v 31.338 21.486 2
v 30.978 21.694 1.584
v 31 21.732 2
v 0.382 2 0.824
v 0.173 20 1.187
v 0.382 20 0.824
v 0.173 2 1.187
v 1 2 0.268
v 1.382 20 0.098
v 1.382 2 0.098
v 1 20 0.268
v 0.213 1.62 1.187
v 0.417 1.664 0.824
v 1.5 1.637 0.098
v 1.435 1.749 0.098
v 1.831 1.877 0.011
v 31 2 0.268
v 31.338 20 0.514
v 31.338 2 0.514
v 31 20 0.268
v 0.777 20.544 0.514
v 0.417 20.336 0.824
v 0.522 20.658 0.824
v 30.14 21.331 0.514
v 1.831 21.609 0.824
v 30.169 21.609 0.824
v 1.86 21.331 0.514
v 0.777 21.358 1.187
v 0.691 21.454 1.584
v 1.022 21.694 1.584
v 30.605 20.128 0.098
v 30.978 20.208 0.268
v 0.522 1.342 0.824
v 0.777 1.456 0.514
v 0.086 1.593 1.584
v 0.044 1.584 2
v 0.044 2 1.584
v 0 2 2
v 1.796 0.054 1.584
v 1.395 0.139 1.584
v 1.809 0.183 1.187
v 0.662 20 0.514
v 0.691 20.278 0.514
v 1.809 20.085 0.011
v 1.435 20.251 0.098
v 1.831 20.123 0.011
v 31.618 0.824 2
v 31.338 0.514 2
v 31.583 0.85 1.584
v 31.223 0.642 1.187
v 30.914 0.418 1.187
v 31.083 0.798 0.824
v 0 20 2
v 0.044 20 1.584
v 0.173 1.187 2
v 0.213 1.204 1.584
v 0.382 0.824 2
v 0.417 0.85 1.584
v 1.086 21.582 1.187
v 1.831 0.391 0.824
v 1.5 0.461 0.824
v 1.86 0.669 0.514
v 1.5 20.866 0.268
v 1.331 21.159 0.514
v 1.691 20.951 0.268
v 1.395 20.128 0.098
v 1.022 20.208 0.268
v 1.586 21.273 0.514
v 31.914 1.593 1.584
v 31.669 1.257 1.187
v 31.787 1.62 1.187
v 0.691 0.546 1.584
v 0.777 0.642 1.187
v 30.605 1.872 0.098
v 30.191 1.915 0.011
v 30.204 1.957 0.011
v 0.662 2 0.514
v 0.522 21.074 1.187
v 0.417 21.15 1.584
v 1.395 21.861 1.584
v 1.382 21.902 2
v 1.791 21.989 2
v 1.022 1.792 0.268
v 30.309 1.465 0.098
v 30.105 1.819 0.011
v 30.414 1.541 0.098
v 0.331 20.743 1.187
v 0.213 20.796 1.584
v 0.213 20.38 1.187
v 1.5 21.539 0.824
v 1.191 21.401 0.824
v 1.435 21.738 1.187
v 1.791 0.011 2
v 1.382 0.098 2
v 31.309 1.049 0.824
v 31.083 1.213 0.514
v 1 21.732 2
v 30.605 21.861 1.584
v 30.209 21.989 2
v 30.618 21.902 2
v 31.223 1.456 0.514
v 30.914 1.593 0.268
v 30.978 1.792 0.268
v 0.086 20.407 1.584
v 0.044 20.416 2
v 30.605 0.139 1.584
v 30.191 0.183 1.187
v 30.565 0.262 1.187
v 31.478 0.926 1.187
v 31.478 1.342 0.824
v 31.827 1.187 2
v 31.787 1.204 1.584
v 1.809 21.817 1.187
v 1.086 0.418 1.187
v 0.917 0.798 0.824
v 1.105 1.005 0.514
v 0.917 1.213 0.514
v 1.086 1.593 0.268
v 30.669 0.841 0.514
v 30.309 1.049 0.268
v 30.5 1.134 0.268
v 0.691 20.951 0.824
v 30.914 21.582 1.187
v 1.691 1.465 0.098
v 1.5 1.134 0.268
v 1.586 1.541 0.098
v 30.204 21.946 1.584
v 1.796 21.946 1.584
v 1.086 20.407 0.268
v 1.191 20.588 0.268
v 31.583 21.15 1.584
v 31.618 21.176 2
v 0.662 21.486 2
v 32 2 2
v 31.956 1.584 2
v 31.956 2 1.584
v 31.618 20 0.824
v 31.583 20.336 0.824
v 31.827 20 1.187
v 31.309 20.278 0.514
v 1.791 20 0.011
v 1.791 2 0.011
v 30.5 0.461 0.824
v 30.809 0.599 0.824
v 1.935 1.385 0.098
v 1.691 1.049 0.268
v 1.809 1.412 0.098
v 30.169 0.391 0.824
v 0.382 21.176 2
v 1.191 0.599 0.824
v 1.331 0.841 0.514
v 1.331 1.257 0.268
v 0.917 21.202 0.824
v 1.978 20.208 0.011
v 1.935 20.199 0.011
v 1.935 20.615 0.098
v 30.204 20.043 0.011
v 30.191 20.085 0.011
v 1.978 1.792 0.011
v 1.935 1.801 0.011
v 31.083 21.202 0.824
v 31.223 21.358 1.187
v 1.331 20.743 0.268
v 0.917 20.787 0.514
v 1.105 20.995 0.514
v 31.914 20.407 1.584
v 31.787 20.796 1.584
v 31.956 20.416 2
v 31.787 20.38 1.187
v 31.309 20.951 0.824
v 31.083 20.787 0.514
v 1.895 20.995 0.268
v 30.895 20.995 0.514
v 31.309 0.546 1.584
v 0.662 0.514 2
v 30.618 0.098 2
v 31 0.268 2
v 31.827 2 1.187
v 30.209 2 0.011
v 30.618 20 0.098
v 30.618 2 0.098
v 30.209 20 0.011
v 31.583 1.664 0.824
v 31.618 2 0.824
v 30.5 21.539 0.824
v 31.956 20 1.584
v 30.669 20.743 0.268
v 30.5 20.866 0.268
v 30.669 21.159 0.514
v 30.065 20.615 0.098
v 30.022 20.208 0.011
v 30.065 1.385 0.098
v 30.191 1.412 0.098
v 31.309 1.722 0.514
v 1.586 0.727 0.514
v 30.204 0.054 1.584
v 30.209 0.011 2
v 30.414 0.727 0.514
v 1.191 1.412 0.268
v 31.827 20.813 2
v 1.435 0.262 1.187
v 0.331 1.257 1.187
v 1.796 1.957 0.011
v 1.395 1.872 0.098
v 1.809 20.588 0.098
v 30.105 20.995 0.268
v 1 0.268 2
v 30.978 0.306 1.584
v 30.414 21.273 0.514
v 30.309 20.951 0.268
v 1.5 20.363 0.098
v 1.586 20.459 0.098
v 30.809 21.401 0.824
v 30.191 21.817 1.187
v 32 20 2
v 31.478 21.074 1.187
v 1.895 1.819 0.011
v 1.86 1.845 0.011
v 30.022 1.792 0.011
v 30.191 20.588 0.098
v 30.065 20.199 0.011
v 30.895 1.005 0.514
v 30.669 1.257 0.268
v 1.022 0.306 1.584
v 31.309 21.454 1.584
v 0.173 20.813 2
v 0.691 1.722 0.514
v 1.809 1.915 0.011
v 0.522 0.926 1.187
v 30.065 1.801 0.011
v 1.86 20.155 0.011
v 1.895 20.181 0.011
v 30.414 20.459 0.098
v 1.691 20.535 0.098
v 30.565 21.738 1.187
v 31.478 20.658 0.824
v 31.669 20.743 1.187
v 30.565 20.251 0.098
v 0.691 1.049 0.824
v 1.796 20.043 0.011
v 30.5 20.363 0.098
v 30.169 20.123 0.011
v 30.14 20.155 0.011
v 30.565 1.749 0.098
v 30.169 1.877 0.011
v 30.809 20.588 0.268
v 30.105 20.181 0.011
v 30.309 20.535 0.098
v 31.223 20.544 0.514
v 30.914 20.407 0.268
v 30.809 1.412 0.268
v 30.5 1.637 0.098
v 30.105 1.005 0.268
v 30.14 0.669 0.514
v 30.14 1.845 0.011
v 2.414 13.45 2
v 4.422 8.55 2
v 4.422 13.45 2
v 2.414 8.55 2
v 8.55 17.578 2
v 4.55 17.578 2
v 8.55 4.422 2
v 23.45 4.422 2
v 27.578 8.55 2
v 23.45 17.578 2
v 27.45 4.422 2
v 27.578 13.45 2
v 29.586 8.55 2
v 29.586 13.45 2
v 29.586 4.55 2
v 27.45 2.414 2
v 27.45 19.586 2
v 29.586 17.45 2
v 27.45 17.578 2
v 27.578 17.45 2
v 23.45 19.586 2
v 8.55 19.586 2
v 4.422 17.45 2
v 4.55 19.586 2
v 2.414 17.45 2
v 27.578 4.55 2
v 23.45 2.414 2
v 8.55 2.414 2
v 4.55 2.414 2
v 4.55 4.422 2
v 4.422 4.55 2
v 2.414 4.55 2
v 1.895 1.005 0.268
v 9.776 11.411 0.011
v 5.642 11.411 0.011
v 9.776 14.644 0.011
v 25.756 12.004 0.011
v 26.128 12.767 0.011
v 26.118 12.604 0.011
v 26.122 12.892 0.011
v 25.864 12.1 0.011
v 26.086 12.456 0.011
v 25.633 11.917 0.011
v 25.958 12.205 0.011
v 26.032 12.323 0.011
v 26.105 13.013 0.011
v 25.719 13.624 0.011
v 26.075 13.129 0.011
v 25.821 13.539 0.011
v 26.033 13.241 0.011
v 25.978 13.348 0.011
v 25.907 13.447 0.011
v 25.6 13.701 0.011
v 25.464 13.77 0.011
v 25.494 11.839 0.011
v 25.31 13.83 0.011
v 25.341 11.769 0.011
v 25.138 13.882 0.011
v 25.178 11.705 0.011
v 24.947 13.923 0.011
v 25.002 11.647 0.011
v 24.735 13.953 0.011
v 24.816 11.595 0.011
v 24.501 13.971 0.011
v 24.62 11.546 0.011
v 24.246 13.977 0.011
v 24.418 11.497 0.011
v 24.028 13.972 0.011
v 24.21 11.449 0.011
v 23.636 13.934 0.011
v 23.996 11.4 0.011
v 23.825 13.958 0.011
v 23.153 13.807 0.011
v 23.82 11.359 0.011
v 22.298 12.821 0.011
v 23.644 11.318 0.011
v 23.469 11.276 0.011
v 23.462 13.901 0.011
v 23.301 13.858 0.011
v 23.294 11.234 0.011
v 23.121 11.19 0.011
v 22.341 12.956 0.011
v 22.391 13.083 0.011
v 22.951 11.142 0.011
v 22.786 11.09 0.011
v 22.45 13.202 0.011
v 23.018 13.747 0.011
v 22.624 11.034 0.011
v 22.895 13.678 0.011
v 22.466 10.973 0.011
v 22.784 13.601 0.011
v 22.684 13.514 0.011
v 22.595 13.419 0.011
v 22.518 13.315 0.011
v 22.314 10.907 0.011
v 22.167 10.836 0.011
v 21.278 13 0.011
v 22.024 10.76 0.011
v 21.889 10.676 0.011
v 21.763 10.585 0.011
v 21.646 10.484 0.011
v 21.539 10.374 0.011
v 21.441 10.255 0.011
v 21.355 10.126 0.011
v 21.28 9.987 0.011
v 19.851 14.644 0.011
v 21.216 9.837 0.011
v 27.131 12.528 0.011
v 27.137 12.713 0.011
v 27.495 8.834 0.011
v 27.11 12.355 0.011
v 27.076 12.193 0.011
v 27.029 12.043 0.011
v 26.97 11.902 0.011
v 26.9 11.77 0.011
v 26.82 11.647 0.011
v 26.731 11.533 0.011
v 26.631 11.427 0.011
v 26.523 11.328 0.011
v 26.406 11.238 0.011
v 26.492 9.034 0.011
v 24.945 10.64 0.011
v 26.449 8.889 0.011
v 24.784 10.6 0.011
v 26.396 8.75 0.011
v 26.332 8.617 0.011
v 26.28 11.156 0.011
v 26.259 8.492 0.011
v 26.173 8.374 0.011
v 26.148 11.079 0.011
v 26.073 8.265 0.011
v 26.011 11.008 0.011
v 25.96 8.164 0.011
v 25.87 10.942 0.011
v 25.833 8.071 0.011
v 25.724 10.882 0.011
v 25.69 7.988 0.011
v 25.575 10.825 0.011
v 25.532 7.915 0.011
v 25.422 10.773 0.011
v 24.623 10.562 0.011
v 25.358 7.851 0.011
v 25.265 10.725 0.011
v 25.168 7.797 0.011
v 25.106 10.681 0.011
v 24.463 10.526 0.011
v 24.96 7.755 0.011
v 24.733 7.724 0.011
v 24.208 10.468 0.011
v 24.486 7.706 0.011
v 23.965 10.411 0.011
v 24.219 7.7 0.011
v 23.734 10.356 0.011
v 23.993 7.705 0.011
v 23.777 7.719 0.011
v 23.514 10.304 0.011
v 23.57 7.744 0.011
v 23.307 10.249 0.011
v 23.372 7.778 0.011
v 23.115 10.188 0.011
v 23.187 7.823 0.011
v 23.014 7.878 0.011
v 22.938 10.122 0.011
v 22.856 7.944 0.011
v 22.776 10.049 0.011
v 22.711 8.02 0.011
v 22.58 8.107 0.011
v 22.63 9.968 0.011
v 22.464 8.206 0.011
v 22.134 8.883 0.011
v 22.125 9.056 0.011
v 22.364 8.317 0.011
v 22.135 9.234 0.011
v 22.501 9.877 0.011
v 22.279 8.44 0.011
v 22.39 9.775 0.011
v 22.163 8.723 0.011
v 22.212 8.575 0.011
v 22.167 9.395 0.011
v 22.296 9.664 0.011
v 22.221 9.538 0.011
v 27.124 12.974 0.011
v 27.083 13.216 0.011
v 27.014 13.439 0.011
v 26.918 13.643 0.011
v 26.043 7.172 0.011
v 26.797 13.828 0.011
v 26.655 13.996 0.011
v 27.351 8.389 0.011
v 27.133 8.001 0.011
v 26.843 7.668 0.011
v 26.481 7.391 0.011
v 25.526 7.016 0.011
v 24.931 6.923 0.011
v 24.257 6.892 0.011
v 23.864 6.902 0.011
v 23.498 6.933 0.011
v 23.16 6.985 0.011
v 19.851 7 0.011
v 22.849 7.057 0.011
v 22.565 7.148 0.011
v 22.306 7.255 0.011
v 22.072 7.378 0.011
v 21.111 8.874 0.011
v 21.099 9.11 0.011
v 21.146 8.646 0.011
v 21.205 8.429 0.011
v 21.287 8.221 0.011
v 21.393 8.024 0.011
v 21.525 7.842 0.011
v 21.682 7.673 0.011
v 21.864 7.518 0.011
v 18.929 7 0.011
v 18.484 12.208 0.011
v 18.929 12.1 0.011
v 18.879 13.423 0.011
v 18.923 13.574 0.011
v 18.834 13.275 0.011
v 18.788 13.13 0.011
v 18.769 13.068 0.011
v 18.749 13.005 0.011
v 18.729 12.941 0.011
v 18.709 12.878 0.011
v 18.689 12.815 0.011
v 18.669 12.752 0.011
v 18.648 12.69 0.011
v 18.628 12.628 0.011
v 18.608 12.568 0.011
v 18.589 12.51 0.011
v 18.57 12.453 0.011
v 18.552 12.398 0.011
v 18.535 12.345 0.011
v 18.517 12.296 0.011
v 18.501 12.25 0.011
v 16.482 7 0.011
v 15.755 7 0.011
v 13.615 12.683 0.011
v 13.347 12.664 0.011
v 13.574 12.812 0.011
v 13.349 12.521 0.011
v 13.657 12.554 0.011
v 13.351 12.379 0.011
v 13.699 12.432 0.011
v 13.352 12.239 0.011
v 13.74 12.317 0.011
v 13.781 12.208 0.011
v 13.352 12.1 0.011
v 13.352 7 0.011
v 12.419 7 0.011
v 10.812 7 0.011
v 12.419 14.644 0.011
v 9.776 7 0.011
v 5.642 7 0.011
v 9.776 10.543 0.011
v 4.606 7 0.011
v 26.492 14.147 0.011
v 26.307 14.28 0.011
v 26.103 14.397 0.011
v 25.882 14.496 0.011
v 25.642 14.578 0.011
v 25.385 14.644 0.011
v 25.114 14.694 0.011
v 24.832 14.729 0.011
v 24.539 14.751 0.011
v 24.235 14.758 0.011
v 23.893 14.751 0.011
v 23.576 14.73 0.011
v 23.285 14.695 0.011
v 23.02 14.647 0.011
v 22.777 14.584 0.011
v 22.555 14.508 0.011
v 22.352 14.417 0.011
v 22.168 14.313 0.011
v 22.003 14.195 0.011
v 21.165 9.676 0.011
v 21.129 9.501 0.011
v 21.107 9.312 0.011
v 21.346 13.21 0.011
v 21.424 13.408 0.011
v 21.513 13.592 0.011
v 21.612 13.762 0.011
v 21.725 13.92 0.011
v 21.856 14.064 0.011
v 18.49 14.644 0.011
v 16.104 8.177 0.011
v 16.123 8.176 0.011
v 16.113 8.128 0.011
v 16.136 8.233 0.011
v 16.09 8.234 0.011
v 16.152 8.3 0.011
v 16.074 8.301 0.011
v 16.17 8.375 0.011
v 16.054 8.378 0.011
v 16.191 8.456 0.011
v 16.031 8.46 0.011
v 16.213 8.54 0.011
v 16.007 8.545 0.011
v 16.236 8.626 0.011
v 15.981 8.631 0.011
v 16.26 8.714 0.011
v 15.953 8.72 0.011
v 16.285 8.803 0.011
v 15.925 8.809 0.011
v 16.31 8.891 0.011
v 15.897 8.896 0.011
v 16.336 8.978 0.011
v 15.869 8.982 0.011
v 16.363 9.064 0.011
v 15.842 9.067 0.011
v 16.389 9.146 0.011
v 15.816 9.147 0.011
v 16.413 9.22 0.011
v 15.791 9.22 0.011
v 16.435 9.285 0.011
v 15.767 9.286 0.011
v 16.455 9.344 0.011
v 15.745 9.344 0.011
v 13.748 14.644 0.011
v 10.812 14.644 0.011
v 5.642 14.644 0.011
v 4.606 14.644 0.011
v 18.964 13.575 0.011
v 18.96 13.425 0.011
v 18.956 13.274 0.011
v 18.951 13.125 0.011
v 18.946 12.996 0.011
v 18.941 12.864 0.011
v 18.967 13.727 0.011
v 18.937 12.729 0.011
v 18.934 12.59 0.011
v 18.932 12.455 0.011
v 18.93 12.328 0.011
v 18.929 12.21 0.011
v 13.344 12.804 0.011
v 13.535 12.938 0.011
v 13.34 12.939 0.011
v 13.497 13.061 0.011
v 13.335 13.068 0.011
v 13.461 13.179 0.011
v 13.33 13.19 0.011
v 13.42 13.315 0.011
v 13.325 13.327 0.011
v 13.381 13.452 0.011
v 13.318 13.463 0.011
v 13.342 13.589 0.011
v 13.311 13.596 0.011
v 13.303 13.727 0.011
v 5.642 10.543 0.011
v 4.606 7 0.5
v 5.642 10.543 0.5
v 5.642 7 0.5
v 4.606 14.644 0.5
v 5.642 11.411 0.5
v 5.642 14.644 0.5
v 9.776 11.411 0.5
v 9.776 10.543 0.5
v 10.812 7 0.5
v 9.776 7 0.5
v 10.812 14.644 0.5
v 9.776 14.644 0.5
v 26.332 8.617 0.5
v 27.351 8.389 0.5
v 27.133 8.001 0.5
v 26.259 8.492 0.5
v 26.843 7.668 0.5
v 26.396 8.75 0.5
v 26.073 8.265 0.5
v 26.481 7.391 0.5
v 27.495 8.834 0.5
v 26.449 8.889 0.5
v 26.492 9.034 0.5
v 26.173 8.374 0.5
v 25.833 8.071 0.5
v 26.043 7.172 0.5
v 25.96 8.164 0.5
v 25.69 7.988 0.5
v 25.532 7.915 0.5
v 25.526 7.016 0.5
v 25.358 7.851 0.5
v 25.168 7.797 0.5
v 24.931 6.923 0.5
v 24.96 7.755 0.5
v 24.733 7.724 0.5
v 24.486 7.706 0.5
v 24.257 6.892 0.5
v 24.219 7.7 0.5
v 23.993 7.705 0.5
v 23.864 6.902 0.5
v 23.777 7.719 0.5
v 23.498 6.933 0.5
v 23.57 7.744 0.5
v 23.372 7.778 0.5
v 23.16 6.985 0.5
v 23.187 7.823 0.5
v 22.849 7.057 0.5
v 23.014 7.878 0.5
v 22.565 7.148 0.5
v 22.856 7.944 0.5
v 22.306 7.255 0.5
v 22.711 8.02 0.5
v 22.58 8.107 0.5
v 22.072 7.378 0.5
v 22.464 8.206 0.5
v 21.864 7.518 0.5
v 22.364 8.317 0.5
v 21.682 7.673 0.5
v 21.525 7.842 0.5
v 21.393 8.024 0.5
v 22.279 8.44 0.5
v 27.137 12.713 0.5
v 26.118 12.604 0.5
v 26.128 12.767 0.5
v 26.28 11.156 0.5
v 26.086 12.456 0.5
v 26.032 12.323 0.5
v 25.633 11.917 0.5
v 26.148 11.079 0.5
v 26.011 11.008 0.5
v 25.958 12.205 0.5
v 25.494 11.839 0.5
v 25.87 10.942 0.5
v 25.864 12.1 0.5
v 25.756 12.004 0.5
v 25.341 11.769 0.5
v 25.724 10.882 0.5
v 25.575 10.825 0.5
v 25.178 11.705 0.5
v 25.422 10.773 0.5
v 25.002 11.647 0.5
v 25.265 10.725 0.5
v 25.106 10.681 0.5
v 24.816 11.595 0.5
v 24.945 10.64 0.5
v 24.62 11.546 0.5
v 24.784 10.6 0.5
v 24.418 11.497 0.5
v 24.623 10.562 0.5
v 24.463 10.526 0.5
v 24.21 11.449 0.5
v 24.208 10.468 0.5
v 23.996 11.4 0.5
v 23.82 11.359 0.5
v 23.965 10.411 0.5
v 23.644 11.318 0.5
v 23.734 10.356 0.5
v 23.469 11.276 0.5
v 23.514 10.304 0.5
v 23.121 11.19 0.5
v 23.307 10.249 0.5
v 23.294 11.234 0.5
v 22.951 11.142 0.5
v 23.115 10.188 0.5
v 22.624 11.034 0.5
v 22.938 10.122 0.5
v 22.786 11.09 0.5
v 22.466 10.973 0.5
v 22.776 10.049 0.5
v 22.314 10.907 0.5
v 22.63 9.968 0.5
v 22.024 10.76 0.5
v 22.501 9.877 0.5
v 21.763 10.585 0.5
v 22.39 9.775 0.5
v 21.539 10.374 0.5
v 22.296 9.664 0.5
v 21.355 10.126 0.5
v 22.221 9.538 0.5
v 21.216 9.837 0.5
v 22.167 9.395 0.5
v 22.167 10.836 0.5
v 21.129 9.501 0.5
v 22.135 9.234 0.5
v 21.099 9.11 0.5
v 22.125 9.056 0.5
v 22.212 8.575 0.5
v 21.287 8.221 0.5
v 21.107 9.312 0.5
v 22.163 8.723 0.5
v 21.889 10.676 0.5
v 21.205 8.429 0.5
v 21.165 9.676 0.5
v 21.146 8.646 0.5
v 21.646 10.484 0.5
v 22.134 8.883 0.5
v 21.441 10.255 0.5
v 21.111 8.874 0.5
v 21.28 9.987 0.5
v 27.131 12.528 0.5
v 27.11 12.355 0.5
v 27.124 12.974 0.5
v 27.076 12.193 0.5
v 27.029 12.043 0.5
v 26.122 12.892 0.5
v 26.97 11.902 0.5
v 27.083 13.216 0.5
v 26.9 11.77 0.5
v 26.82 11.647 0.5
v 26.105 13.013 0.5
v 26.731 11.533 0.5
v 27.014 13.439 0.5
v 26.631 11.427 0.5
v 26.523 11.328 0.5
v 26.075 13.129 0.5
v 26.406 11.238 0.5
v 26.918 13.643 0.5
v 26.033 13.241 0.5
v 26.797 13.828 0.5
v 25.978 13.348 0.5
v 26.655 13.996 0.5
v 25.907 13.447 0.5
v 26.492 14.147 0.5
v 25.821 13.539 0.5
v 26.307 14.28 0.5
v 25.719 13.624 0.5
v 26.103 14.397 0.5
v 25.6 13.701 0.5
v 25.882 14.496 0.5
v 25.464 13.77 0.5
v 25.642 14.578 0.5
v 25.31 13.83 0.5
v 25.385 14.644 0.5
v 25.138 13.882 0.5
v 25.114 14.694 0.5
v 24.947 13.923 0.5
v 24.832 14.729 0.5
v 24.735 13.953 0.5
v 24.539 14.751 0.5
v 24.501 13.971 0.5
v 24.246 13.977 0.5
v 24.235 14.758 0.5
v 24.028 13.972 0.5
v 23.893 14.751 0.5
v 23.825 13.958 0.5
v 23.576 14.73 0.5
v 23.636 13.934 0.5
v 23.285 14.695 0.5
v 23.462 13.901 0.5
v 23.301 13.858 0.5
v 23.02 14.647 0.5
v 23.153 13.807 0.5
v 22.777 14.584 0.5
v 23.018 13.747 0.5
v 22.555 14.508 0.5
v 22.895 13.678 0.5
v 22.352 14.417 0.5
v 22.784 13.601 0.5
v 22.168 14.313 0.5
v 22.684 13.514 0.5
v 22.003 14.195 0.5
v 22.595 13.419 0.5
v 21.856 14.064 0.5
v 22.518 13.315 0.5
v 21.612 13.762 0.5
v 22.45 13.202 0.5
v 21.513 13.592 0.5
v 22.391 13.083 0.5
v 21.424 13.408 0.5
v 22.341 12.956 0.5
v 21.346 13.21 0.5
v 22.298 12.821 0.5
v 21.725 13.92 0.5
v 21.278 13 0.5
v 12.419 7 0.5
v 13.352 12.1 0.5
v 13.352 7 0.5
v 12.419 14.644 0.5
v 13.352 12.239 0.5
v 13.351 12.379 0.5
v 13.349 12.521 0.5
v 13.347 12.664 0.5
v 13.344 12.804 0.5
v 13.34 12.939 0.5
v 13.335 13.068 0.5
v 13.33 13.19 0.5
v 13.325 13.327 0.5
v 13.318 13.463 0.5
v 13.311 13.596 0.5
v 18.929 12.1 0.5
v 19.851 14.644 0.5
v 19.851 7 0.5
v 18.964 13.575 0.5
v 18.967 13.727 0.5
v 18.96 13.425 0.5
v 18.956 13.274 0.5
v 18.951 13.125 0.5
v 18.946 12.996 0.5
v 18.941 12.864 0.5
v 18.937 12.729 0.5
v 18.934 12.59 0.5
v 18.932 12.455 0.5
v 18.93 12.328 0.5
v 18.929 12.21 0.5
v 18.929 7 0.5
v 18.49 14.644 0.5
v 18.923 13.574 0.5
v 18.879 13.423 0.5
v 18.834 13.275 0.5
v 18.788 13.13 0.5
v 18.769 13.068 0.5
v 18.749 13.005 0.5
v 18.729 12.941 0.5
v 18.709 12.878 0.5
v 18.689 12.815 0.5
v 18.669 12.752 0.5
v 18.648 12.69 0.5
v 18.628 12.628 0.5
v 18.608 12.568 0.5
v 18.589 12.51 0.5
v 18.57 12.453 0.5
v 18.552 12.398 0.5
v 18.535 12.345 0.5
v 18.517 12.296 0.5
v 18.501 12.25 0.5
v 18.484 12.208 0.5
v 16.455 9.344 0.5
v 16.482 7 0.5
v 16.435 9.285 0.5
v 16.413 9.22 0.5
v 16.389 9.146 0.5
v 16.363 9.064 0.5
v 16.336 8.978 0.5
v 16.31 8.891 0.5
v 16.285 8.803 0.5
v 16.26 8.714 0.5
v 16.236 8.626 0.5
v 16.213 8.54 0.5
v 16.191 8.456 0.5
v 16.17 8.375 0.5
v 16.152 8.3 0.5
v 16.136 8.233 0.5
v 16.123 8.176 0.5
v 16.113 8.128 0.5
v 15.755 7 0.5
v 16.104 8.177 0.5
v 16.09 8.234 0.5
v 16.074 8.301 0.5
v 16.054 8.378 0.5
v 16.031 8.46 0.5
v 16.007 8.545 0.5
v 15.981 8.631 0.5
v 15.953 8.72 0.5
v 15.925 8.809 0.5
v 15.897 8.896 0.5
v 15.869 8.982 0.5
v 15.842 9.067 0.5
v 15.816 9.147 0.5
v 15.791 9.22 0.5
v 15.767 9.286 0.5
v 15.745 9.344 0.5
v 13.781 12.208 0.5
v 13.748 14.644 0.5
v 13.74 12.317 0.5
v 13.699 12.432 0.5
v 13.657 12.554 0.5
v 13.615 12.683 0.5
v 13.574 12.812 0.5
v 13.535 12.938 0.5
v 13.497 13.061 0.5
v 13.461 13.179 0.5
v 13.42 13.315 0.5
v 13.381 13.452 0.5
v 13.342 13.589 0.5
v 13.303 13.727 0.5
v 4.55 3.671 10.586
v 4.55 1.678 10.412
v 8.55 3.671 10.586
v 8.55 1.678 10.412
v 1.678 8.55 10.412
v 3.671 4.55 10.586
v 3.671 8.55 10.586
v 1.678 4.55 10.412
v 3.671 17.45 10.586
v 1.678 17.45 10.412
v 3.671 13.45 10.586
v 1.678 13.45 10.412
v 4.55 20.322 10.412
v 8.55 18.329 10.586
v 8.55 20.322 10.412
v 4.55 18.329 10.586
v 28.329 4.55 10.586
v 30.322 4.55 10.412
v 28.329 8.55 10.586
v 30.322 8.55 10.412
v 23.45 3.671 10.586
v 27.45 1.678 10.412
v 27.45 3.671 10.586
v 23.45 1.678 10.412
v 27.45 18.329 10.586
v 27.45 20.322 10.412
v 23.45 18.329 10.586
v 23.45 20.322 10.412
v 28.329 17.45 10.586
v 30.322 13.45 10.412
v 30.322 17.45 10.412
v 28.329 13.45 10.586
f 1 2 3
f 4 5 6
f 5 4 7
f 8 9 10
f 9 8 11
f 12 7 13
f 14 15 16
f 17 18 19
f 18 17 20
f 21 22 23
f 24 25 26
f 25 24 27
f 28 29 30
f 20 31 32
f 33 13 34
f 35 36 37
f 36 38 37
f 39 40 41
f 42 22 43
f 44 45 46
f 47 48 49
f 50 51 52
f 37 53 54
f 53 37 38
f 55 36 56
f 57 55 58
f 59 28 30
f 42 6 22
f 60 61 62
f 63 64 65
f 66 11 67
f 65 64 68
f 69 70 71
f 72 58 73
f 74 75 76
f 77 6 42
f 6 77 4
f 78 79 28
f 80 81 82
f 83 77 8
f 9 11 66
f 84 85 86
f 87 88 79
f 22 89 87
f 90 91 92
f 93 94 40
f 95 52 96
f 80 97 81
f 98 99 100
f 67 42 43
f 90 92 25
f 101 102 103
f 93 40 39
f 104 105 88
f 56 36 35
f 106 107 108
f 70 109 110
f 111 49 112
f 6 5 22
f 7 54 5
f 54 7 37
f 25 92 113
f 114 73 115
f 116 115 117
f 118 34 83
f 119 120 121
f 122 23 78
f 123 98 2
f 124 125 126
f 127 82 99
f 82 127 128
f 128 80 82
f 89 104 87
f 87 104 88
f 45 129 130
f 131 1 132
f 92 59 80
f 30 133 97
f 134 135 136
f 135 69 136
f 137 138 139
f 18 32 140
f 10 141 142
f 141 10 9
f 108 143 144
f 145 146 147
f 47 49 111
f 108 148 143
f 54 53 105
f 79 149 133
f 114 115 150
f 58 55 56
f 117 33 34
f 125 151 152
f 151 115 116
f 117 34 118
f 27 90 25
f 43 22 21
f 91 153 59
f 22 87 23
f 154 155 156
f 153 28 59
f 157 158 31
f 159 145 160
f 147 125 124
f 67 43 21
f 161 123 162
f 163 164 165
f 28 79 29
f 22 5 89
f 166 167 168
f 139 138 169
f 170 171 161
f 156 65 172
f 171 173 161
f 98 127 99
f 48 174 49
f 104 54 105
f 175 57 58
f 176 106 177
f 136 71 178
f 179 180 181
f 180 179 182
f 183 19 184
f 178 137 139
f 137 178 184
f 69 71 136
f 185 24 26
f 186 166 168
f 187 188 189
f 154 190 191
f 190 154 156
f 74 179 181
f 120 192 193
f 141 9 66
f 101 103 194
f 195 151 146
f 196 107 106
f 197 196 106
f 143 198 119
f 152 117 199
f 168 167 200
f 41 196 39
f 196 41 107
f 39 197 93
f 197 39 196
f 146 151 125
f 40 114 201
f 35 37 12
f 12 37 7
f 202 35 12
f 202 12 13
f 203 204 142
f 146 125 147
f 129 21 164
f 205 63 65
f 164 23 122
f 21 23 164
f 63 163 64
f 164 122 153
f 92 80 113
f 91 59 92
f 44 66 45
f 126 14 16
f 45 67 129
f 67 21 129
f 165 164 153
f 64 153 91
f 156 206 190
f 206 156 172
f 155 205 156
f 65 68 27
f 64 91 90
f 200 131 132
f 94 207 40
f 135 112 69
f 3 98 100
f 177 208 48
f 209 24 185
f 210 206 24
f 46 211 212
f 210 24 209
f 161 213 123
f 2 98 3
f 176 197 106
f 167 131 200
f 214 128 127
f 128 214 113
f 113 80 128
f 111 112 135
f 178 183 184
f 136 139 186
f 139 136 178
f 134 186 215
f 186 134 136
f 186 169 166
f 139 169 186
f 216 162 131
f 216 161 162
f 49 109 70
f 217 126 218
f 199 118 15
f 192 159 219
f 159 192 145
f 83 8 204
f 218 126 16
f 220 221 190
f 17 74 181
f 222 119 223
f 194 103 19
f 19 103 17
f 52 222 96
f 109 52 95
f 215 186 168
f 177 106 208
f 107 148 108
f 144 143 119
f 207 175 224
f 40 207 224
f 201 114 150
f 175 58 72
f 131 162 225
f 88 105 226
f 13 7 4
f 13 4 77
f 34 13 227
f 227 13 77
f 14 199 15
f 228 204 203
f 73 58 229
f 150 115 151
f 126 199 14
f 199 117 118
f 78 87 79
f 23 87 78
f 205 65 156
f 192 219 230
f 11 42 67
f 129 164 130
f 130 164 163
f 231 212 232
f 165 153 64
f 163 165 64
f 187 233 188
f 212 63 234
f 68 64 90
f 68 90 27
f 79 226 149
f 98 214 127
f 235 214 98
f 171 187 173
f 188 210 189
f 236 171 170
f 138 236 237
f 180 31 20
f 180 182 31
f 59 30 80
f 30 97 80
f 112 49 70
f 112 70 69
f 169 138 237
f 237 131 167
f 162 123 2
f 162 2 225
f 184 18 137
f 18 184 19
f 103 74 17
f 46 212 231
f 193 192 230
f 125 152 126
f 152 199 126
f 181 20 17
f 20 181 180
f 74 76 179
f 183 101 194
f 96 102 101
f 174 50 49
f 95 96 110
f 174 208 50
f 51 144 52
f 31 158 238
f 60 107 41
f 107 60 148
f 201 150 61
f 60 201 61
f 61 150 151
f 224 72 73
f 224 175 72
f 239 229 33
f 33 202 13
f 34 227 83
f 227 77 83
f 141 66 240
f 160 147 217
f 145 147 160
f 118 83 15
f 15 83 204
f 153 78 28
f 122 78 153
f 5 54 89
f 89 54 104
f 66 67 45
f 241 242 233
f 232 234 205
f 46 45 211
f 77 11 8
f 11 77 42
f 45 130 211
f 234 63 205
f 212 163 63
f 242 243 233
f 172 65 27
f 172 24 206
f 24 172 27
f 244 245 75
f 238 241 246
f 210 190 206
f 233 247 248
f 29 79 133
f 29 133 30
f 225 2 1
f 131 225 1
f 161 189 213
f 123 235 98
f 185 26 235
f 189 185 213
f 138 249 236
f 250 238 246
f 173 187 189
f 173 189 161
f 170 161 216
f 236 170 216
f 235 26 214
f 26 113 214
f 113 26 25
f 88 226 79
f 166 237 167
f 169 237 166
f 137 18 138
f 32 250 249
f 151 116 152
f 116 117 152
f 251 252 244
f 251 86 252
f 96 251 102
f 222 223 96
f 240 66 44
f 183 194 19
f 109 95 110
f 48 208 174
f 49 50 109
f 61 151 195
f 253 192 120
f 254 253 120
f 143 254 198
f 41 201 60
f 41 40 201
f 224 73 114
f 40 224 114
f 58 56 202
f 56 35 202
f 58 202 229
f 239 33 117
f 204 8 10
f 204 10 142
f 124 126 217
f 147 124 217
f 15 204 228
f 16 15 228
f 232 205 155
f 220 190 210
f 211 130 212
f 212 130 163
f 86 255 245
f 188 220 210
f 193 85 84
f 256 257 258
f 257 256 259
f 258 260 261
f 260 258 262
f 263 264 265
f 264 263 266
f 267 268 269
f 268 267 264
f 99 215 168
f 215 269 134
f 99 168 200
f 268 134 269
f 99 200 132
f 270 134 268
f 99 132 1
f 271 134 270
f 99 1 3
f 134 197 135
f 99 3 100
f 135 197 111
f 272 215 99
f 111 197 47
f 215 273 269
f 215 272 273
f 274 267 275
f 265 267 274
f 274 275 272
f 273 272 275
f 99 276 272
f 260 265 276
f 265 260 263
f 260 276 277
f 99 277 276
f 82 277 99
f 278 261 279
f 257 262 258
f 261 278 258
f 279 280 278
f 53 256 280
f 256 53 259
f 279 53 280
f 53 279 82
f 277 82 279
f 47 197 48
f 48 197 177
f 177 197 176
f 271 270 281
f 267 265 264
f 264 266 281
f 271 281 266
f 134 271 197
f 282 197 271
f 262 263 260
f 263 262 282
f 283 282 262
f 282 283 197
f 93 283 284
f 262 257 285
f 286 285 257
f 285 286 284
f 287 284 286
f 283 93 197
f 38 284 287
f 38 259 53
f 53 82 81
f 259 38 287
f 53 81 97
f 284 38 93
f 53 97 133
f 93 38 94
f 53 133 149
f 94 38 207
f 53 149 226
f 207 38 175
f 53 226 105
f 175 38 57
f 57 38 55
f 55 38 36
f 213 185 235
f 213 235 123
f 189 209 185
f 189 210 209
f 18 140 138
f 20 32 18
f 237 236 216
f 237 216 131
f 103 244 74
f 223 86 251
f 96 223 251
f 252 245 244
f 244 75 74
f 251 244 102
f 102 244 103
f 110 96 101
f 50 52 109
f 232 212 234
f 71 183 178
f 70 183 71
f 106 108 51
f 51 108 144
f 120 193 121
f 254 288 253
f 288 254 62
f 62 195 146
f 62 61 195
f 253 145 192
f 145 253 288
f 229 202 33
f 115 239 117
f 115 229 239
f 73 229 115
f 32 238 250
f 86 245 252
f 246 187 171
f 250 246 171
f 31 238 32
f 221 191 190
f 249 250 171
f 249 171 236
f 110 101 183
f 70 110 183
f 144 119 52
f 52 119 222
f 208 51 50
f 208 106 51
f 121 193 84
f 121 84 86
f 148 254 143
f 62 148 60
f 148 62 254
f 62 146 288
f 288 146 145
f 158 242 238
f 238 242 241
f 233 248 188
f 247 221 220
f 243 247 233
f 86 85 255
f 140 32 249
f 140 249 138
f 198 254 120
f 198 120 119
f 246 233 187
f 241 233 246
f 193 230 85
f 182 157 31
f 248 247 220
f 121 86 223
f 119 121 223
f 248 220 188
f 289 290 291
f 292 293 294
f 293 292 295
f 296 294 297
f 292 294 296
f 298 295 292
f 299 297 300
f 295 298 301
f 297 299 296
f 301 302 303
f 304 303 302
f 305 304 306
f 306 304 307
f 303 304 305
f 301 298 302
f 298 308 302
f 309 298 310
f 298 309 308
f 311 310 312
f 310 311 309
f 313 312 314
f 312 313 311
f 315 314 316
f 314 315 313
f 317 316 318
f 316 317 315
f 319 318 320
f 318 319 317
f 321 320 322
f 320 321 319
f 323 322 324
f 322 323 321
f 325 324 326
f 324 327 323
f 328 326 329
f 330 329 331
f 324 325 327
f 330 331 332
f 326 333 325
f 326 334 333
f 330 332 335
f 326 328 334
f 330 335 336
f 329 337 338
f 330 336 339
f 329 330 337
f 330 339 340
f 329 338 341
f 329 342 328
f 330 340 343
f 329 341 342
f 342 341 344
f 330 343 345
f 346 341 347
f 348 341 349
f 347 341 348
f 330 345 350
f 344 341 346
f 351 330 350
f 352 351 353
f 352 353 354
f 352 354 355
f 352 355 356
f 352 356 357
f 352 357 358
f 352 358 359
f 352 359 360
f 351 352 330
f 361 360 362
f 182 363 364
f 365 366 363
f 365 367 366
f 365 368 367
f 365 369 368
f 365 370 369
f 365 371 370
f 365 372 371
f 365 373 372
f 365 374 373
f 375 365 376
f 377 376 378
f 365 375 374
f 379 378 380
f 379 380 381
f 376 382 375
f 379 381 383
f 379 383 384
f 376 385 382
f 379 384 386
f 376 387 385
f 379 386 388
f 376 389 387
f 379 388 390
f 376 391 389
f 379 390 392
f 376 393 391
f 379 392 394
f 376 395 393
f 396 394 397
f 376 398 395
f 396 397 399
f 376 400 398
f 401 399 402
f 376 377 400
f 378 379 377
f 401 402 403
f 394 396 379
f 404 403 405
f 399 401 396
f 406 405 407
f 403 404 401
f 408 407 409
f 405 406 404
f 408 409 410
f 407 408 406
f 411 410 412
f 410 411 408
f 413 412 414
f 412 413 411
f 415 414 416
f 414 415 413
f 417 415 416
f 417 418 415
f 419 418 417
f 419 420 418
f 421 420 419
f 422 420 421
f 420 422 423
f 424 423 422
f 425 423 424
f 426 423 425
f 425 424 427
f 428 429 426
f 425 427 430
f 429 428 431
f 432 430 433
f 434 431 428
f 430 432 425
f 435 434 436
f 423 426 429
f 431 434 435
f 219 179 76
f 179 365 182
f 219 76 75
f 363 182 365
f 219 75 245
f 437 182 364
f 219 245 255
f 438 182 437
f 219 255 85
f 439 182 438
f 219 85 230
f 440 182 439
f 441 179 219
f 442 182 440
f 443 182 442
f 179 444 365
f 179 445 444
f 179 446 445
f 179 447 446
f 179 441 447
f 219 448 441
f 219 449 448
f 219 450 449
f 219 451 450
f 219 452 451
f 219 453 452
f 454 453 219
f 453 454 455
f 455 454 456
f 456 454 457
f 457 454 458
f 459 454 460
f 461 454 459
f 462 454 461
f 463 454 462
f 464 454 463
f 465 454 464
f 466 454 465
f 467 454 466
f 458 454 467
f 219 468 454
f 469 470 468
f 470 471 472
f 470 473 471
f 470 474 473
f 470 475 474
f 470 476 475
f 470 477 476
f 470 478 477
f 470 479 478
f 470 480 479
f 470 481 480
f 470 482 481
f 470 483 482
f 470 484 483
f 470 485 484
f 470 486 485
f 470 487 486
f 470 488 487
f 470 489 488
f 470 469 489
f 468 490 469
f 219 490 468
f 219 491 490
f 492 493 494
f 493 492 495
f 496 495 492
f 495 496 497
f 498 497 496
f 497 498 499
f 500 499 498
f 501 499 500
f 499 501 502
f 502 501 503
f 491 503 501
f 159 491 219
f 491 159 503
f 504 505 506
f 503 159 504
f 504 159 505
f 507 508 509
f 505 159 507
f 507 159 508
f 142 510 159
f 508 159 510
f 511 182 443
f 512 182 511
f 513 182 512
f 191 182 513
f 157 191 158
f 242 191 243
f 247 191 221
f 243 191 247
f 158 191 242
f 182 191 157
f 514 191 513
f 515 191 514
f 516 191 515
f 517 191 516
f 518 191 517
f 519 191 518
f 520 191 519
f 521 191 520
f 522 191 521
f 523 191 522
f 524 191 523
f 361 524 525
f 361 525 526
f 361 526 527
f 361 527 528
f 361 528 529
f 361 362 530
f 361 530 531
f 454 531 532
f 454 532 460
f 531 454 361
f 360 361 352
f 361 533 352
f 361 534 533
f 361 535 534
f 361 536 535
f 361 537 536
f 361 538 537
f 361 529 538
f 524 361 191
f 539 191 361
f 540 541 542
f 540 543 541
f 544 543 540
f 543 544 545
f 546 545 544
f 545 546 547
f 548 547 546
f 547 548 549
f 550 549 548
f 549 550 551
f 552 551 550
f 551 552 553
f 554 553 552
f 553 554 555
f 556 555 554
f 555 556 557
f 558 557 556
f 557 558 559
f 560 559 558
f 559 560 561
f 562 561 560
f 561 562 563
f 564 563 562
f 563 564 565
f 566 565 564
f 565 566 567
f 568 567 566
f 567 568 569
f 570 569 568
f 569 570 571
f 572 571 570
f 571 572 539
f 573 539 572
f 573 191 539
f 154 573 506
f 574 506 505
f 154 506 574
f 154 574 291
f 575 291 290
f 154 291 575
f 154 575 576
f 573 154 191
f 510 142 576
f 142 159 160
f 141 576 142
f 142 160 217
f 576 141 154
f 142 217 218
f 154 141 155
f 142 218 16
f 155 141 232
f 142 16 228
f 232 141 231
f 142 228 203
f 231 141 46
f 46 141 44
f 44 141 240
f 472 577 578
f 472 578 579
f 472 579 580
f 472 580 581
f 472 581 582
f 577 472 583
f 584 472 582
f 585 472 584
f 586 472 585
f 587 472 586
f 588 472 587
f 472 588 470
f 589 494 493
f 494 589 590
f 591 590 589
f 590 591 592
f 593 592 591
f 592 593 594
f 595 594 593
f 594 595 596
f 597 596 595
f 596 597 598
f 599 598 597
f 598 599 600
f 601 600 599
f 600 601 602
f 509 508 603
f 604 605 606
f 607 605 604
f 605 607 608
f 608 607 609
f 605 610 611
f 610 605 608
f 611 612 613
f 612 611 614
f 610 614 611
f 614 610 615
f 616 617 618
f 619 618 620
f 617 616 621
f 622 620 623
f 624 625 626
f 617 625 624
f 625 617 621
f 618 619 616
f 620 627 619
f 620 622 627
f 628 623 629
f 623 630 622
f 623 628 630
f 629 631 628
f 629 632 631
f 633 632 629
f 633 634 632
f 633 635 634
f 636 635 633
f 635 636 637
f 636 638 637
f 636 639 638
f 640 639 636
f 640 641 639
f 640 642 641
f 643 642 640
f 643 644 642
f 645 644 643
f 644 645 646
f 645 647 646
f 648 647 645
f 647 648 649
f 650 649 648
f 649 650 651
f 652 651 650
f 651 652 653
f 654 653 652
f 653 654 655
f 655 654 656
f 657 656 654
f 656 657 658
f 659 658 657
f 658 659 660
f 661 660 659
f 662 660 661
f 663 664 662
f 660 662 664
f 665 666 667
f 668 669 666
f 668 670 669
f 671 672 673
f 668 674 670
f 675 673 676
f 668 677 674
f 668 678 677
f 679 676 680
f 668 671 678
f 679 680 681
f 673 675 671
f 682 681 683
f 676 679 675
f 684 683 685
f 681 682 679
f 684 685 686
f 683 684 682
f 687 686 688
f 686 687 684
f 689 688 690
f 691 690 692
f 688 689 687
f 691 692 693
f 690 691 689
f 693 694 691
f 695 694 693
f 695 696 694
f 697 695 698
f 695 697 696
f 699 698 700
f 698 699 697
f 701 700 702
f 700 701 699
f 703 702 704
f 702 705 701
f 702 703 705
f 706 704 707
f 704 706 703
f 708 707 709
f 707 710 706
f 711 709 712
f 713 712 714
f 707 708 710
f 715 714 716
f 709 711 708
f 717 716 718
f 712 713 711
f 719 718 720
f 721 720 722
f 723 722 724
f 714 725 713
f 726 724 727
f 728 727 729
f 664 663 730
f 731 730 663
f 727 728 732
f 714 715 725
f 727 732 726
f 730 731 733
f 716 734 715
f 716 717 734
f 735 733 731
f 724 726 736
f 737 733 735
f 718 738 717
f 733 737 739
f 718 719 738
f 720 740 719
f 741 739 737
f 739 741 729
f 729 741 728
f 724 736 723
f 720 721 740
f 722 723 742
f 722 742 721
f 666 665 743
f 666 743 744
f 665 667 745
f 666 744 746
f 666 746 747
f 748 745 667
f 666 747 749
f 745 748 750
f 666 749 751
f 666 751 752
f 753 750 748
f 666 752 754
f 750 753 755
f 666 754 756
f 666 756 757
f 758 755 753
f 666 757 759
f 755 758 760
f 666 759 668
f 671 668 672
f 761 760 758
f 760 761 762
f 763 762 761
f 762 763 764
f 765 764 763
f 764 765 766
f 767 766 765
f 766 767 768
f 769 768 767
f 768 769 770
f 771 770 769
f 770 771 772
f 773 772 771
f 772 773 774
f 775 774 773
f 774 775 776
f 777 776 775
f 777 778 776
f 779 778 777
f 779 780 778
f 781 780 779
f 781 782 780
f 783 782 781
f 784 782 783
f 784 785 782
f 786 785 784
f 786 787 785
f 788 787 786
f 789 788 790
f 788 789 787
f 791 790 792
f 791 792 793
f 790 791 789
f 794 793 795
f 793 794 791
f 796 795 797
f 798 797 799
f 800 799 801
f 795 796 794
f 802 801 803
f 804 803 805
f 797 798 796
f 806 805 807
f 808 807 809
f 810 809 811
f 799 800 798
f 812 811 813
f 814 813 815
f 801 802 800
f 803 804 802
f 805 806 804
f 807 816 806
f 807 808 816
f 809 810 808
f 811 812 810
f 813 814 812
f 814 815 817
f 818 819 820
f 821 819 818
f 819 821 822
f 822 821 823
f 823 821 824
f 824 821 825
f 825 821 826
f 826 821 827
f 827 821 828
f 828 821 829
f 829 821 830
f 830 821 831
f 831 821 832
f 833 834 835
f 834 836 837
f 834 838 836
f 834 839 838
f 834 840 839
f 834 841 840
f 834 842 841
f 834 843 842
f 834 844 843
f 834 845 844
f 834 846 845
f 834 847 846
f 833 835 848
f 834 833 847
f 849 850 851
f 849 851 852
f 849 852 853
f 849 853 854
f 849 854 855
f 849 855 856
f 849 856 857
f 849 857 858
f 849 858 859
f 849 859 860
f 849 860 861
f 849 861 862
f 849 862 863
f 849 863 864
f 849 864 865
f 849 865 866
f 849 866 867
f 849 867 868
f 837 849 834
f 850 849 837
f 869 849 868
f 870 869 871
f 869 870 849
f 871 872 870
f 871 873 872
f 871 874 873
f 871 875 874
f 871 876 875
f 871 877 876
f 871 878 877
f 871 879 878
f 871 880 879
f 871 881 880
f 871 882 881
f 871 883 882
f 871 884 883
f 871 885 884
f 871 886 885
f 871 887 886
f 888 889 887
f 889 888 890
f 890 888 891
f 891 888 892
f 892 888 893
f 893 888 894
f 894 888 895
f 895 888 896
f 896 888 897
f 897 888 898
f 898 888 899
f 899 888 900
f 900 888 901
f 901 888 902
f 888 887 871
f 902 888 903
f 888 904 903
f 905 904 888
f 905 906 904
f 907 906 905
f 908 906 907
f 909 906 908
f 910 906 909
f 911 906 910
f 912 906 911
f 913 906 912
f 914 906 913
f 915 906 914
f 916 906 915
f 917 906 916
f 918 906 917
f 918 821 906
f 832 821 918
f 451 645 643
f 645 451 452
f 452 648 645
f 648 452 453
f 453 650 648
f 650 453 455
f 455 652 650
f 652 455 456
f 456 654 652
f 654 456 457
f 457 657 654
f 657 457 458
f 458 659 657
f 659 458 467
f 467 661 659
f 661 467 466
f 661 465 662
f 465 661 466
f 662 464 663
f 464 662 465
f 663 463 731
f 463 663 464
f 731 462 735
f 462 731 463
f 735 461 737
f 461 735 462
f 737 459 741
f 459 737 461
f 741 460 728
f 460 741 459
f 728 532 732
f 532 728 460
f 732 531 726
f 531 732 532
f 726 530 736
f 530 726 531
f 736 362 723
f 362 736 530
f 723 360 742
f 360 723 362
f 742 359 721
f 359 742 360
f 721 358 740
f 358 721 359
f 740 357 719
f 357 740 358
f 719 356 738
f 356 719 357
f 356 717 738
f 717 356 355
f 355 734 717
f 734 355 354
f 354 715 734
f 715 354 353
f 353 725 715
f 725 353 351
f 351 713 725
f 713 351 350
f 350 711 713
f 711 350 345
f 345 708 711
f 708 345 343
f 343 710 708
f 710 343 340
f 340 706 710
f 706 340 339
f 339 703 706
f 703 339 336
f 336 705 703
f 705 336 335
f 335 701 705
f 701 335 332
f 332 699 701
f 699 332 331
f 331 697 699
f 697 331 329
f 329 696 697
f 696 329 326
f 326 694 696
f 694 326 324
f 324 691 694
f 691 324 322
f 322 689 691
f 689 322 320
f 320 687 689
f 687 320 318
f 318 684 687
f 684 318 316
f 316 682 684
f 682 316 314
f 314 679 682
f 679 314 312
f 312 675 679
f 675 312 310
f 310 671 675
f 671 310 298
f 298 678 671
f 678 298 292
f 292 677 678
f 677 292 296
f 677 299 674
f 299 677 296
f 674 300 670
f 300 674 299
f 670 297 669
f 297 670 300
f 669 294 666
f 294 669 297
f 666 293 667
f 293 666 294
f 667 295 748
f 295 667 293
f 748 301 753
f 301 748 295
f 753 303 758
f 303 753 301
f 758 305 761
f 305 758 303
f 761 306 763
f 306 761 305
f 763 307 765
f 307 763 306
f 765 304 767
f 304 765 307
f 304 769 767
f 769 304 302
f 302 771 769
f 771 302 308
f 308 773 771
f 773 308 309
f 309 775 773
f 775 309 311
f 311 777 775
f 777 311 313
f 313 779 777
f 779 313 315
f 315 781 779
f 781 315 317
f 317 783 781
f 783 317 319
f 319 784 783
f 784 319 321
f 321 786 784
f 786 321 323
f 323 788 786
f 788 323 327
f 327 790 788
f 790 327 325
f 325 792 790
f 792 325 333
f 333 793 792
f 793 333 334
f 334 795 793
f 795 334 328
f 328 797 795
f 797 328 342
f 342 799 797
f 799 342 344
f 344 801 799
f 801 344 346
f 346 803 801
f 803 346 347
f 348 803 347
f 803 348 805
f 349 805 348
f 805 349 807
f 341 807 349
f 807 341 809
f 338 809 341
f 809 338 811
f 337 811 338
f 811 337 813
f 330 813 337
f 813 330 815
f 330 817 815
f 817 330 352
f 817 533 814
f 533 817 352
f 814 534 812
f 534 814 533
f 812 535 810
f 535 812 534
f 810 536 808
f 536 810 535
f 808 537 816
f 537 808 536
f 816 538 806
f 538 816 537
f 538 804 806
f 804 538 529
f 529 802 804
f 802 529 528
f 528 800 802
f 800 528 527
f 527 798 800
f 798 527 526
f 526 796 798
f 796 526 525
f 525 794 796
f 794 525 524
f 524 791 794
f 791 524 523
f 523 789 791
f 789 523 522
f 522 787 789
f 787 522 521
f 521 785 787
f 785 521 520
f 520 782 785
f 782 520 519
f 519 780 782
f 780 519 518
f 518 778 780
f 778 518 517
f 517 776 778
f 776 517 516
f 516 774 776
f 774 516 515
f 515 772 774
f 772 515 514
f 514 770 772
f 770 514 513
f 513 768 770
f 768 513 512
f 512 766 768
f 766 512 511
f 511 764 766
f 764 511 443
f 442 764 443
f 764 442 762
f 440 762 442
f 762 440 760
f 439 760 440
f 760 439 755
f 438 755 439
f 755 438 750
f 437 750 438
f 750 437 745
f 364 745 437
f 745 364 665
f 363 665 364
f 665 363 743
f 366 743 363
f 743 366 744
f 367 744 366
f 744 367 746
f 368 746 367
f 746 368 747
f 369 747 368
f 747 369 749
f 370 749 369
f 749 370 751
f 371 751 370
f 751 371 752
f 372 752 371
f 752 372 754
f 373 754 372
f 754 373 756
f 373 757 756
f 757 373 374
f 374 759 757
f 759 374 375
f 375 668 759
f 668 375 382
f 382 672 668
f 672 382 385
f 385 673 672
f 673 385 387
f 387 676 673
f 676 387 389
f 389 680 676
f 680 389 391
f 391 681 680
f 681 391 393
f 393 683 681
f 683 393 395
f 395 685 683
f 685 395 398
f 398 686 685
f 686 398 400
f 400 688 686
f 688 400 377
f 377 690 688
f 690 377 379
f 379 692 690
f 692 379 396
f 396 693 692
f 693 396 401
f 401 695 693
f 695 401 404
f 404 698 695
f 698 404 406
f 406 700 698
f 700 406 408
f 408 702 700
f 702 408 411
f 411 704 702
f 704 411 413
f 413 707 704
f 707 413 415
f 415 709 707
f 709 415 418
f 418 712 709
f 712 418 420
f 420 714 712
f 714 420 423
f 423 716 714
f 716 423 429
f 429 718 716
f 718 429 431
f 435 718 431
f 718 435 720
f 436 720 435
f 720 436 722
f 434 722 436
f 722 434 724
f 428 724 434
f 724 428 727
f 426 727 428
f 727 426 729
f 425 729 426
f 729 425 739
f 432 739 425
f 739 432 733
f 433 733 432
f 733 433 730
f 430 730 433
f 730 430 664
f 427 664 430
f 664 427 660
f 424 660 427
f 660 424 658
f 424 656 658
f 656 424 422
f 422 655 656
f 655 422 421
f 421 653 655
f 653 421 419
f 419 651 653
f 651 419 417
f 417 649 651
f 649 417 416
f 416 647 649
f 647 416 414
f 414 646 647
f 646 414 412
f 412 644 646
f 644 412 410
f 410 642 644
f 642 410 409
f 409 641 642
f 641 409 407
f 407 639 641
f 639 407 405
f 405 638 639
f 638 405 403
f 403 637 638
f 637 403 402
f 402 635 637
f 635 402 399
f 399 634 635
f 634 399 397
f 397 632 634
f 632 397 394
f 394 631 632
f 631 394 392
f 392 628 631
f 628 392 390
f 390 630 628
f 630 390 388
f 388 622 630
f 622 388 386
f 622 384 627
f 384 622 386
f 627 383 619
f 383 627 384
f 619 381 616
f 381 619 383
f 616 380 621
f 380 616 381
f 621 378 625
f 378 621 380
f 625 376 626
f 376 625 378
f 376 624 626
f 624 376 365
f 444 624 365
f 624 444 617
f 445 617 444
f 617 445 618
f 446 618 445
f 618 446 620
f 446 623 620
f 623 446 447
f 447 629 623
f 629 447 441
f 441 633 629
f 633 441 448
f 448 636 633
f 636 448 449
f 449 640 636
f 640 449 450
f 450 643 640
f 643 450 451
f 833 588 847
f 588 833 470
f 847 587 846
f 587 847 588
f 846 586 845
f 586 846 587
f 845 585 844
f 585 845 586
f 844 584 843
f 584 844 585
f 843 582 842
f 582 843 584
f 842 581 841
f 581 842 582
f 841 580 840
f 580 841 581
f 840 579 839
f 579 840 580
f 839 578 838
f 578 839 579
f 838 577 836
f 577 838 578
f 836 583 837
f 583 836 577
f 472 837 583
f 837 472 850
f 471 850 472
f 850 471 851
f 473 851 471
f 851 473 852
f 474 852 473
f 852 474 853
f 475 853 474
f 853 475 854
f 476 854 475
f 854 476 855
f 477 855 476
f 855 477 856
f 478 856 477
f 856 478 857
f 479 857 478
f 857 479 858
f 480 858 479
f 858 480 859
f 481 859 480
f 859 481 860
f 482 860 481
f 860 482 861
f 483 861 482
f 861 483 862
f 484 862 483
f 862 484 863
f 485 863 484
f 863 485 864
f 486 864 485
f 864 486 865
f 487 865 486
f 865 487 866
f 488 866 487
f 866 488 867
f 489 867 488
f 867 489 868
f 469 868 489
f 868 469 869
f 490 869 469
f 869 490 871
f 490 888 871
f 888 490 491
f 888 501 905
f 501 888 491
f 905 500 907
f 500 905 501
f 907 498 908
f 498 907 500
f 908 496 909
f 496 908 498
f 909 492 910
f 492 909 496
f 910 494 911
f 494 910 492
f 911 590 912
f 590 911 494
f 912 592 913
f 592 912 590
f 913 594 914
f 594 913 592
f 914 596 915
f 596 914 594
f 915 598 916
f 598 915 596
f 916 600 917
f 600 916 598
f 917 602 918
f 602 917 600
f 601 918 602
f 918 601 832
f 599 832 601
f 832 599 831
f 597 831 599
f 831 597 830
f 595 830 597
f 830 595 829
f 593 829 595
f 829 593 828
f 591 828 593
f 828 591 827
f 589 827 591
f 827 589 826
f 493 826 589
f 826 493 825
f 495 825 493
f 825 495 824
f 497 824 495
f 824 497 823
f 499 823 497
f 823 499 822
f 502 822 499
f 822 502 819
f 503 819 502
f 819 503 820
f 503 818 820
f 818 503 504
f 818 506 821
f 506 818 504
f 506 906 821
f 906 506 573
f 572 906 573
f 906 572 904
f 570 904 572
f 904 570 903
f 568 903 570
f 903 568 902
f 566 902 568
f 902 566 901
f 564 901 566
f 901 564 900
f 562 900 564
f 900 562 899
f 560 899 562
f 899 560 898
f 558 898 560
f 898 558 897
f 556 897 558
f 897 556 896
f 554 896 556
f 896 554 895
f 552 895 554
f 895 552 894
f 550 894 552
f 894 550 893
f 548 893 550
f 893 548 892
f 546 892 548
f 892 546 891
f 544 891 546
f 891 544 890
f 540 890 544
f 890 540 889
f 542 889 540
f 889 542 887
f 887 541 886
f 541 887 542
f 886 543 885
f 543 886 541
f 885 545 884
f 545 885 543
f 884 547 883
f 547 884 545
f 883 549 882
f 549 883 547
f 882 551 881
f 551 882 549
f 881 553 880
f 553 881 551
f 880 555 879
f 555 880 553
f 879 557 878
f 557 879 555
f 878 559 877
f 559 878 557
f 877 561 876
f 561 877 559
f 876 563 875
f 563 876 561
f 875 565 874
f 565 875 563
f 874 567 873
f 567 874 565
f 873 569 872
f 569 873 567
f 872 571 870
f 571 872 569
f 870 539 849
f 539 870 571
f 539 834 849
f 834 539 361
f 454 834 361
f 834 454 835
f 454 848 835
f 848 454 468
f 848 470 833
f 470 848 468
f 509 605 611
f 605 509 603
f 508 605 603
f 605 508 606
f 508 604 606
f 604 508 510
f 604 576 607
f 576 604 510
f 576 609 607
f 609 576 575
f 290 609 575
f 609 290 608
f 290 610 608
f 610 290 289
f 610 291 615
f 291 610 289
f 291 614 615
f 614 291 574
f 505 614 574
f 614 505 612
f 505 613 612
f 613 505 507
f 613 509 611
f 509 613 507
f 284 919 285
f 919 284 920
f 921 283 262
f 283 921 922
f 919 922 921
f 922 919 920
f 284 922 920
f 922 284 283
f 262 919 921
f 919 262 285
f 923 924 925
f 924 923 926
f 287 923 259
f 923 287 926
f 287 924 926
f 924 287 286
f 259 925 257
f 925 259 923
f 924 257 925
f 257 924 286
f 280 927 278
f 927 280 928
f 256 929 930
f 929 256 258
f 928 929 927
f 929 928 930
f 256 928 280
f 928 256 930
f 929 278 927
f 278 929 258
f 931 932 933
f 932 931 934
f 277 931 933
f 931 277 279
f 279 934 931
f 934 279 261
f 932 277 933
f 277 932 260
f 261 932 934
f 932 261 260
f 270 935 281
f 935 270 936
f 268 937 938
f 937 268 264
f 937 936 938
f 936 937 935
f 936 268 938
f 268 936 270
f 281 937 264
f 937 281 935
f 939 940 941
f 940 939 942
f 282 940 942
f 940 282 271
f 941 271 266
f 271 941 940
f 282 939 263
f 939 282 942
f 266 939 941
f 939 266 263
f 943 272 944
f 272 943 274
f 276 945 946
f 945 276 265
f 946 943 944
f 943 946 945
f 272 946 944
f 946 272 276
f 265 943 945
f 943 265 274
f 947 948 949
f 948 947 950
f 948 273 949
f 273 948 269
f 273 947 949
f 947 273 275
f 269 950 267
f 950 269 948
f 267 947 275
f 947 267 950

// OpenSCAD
/*
AUTHOR: Samuel M.H. <samuel.mh@gmail.com>
DESCRIPTION:
  A cap for rectangular section tubes.
*/ 


//PARAMETERS

$fn = 30;
NZ = 0.0000000001;  //So operations are NEVER ZERO

// Tube
T_WIDTH = 30; //Outer dimension of the tube
T_LENGTH = 20; //Outer dimension of the tube
T_THICK = 1.55; // Section of the tube


// Lid
L_MARGIN = 1;  //How much bigger is the lid with respect to the tube
L_THICK = 2;  //Thickness of the lid
L_RADIUS = 2;  //Smoothered corners
L_BRAND_DEPTH = 0.5; //Depth of the brand engravement
L_BRAND = "SMH";  //Will require manual tweaking


// Supports
S_DIM = [4, 2 , 10]; //Width, Length, Height of a single support
S_ROT = 5; //How much the support is rotated to make friction



// CONSTANTS (calculated from parameters)
L_WIDTH = T_WIDTH+2*L_MARGIN;
L_LENGTH = T_LENGTH+2*L_MARGIN;


//MODULES

module lid(){
    translate([L_RADIUS, L_RADIUS, 0])
    difference(){
        minkowski(){
            cube([
                L_WIDTH-2*L_RADIUS+NZ,
                L_LENGTH-2*L_RADIUS+NZ,
                L_THICK-L_RADIUS+NZ
            ]);
            difference(){
                sphere(r=L_RADIUS);
                translate([-L_RADIUS, -L_RADIUS, -L_RADIUS*2])
                cube(L_RADIUS*2);
            }
        }
        translate([2,5,L_THICK-L_BRAND_DEPTH+NZ])
        linear_extrude(L_BRAND_DEPTH)
        text(L_BRAND, size=8);
    }
}

module support(){
    translate([S_DIM[1], 0, 0])
    rotate([S_ROT,0,0])
    cube(S_DIM);
    rotate([0,-S_ROT,0])
    translate([S_DIM[1], S_DIM[1],0])
    rotate([0,0,90])
    cube(S_DIM);
}



// Model

translate([0,0,L_THICK])
union(){
    //Lid
    translate([L_WIDTH,0,0])
    rotate([0,180,0])
    lid();
    //4 Corner supports
    translate([0,0,-T_THICK+NZ])
    union(){
        translate([L_MARGIN+T_THICK, L_MARGIN+T_THICK,0])
        support();
        translate([L_MARGIN+T_THICK, L_LENGTH-L_MARGIN-T_THICK,0])
        rotate([0,0,-90])
        support();
        translate([L_WIDTH-L_MARGIN-T_THICK, L_MARGIN+T_THICK,0])
        rotate([0,0,90])
        support();
        translate([L_WIDTH-L_MARGIN-T_THICK, L_LENGTH-L_MARGIN-T_THICK ,0])
        rotate([0,0,180])
        support();
    }
}
